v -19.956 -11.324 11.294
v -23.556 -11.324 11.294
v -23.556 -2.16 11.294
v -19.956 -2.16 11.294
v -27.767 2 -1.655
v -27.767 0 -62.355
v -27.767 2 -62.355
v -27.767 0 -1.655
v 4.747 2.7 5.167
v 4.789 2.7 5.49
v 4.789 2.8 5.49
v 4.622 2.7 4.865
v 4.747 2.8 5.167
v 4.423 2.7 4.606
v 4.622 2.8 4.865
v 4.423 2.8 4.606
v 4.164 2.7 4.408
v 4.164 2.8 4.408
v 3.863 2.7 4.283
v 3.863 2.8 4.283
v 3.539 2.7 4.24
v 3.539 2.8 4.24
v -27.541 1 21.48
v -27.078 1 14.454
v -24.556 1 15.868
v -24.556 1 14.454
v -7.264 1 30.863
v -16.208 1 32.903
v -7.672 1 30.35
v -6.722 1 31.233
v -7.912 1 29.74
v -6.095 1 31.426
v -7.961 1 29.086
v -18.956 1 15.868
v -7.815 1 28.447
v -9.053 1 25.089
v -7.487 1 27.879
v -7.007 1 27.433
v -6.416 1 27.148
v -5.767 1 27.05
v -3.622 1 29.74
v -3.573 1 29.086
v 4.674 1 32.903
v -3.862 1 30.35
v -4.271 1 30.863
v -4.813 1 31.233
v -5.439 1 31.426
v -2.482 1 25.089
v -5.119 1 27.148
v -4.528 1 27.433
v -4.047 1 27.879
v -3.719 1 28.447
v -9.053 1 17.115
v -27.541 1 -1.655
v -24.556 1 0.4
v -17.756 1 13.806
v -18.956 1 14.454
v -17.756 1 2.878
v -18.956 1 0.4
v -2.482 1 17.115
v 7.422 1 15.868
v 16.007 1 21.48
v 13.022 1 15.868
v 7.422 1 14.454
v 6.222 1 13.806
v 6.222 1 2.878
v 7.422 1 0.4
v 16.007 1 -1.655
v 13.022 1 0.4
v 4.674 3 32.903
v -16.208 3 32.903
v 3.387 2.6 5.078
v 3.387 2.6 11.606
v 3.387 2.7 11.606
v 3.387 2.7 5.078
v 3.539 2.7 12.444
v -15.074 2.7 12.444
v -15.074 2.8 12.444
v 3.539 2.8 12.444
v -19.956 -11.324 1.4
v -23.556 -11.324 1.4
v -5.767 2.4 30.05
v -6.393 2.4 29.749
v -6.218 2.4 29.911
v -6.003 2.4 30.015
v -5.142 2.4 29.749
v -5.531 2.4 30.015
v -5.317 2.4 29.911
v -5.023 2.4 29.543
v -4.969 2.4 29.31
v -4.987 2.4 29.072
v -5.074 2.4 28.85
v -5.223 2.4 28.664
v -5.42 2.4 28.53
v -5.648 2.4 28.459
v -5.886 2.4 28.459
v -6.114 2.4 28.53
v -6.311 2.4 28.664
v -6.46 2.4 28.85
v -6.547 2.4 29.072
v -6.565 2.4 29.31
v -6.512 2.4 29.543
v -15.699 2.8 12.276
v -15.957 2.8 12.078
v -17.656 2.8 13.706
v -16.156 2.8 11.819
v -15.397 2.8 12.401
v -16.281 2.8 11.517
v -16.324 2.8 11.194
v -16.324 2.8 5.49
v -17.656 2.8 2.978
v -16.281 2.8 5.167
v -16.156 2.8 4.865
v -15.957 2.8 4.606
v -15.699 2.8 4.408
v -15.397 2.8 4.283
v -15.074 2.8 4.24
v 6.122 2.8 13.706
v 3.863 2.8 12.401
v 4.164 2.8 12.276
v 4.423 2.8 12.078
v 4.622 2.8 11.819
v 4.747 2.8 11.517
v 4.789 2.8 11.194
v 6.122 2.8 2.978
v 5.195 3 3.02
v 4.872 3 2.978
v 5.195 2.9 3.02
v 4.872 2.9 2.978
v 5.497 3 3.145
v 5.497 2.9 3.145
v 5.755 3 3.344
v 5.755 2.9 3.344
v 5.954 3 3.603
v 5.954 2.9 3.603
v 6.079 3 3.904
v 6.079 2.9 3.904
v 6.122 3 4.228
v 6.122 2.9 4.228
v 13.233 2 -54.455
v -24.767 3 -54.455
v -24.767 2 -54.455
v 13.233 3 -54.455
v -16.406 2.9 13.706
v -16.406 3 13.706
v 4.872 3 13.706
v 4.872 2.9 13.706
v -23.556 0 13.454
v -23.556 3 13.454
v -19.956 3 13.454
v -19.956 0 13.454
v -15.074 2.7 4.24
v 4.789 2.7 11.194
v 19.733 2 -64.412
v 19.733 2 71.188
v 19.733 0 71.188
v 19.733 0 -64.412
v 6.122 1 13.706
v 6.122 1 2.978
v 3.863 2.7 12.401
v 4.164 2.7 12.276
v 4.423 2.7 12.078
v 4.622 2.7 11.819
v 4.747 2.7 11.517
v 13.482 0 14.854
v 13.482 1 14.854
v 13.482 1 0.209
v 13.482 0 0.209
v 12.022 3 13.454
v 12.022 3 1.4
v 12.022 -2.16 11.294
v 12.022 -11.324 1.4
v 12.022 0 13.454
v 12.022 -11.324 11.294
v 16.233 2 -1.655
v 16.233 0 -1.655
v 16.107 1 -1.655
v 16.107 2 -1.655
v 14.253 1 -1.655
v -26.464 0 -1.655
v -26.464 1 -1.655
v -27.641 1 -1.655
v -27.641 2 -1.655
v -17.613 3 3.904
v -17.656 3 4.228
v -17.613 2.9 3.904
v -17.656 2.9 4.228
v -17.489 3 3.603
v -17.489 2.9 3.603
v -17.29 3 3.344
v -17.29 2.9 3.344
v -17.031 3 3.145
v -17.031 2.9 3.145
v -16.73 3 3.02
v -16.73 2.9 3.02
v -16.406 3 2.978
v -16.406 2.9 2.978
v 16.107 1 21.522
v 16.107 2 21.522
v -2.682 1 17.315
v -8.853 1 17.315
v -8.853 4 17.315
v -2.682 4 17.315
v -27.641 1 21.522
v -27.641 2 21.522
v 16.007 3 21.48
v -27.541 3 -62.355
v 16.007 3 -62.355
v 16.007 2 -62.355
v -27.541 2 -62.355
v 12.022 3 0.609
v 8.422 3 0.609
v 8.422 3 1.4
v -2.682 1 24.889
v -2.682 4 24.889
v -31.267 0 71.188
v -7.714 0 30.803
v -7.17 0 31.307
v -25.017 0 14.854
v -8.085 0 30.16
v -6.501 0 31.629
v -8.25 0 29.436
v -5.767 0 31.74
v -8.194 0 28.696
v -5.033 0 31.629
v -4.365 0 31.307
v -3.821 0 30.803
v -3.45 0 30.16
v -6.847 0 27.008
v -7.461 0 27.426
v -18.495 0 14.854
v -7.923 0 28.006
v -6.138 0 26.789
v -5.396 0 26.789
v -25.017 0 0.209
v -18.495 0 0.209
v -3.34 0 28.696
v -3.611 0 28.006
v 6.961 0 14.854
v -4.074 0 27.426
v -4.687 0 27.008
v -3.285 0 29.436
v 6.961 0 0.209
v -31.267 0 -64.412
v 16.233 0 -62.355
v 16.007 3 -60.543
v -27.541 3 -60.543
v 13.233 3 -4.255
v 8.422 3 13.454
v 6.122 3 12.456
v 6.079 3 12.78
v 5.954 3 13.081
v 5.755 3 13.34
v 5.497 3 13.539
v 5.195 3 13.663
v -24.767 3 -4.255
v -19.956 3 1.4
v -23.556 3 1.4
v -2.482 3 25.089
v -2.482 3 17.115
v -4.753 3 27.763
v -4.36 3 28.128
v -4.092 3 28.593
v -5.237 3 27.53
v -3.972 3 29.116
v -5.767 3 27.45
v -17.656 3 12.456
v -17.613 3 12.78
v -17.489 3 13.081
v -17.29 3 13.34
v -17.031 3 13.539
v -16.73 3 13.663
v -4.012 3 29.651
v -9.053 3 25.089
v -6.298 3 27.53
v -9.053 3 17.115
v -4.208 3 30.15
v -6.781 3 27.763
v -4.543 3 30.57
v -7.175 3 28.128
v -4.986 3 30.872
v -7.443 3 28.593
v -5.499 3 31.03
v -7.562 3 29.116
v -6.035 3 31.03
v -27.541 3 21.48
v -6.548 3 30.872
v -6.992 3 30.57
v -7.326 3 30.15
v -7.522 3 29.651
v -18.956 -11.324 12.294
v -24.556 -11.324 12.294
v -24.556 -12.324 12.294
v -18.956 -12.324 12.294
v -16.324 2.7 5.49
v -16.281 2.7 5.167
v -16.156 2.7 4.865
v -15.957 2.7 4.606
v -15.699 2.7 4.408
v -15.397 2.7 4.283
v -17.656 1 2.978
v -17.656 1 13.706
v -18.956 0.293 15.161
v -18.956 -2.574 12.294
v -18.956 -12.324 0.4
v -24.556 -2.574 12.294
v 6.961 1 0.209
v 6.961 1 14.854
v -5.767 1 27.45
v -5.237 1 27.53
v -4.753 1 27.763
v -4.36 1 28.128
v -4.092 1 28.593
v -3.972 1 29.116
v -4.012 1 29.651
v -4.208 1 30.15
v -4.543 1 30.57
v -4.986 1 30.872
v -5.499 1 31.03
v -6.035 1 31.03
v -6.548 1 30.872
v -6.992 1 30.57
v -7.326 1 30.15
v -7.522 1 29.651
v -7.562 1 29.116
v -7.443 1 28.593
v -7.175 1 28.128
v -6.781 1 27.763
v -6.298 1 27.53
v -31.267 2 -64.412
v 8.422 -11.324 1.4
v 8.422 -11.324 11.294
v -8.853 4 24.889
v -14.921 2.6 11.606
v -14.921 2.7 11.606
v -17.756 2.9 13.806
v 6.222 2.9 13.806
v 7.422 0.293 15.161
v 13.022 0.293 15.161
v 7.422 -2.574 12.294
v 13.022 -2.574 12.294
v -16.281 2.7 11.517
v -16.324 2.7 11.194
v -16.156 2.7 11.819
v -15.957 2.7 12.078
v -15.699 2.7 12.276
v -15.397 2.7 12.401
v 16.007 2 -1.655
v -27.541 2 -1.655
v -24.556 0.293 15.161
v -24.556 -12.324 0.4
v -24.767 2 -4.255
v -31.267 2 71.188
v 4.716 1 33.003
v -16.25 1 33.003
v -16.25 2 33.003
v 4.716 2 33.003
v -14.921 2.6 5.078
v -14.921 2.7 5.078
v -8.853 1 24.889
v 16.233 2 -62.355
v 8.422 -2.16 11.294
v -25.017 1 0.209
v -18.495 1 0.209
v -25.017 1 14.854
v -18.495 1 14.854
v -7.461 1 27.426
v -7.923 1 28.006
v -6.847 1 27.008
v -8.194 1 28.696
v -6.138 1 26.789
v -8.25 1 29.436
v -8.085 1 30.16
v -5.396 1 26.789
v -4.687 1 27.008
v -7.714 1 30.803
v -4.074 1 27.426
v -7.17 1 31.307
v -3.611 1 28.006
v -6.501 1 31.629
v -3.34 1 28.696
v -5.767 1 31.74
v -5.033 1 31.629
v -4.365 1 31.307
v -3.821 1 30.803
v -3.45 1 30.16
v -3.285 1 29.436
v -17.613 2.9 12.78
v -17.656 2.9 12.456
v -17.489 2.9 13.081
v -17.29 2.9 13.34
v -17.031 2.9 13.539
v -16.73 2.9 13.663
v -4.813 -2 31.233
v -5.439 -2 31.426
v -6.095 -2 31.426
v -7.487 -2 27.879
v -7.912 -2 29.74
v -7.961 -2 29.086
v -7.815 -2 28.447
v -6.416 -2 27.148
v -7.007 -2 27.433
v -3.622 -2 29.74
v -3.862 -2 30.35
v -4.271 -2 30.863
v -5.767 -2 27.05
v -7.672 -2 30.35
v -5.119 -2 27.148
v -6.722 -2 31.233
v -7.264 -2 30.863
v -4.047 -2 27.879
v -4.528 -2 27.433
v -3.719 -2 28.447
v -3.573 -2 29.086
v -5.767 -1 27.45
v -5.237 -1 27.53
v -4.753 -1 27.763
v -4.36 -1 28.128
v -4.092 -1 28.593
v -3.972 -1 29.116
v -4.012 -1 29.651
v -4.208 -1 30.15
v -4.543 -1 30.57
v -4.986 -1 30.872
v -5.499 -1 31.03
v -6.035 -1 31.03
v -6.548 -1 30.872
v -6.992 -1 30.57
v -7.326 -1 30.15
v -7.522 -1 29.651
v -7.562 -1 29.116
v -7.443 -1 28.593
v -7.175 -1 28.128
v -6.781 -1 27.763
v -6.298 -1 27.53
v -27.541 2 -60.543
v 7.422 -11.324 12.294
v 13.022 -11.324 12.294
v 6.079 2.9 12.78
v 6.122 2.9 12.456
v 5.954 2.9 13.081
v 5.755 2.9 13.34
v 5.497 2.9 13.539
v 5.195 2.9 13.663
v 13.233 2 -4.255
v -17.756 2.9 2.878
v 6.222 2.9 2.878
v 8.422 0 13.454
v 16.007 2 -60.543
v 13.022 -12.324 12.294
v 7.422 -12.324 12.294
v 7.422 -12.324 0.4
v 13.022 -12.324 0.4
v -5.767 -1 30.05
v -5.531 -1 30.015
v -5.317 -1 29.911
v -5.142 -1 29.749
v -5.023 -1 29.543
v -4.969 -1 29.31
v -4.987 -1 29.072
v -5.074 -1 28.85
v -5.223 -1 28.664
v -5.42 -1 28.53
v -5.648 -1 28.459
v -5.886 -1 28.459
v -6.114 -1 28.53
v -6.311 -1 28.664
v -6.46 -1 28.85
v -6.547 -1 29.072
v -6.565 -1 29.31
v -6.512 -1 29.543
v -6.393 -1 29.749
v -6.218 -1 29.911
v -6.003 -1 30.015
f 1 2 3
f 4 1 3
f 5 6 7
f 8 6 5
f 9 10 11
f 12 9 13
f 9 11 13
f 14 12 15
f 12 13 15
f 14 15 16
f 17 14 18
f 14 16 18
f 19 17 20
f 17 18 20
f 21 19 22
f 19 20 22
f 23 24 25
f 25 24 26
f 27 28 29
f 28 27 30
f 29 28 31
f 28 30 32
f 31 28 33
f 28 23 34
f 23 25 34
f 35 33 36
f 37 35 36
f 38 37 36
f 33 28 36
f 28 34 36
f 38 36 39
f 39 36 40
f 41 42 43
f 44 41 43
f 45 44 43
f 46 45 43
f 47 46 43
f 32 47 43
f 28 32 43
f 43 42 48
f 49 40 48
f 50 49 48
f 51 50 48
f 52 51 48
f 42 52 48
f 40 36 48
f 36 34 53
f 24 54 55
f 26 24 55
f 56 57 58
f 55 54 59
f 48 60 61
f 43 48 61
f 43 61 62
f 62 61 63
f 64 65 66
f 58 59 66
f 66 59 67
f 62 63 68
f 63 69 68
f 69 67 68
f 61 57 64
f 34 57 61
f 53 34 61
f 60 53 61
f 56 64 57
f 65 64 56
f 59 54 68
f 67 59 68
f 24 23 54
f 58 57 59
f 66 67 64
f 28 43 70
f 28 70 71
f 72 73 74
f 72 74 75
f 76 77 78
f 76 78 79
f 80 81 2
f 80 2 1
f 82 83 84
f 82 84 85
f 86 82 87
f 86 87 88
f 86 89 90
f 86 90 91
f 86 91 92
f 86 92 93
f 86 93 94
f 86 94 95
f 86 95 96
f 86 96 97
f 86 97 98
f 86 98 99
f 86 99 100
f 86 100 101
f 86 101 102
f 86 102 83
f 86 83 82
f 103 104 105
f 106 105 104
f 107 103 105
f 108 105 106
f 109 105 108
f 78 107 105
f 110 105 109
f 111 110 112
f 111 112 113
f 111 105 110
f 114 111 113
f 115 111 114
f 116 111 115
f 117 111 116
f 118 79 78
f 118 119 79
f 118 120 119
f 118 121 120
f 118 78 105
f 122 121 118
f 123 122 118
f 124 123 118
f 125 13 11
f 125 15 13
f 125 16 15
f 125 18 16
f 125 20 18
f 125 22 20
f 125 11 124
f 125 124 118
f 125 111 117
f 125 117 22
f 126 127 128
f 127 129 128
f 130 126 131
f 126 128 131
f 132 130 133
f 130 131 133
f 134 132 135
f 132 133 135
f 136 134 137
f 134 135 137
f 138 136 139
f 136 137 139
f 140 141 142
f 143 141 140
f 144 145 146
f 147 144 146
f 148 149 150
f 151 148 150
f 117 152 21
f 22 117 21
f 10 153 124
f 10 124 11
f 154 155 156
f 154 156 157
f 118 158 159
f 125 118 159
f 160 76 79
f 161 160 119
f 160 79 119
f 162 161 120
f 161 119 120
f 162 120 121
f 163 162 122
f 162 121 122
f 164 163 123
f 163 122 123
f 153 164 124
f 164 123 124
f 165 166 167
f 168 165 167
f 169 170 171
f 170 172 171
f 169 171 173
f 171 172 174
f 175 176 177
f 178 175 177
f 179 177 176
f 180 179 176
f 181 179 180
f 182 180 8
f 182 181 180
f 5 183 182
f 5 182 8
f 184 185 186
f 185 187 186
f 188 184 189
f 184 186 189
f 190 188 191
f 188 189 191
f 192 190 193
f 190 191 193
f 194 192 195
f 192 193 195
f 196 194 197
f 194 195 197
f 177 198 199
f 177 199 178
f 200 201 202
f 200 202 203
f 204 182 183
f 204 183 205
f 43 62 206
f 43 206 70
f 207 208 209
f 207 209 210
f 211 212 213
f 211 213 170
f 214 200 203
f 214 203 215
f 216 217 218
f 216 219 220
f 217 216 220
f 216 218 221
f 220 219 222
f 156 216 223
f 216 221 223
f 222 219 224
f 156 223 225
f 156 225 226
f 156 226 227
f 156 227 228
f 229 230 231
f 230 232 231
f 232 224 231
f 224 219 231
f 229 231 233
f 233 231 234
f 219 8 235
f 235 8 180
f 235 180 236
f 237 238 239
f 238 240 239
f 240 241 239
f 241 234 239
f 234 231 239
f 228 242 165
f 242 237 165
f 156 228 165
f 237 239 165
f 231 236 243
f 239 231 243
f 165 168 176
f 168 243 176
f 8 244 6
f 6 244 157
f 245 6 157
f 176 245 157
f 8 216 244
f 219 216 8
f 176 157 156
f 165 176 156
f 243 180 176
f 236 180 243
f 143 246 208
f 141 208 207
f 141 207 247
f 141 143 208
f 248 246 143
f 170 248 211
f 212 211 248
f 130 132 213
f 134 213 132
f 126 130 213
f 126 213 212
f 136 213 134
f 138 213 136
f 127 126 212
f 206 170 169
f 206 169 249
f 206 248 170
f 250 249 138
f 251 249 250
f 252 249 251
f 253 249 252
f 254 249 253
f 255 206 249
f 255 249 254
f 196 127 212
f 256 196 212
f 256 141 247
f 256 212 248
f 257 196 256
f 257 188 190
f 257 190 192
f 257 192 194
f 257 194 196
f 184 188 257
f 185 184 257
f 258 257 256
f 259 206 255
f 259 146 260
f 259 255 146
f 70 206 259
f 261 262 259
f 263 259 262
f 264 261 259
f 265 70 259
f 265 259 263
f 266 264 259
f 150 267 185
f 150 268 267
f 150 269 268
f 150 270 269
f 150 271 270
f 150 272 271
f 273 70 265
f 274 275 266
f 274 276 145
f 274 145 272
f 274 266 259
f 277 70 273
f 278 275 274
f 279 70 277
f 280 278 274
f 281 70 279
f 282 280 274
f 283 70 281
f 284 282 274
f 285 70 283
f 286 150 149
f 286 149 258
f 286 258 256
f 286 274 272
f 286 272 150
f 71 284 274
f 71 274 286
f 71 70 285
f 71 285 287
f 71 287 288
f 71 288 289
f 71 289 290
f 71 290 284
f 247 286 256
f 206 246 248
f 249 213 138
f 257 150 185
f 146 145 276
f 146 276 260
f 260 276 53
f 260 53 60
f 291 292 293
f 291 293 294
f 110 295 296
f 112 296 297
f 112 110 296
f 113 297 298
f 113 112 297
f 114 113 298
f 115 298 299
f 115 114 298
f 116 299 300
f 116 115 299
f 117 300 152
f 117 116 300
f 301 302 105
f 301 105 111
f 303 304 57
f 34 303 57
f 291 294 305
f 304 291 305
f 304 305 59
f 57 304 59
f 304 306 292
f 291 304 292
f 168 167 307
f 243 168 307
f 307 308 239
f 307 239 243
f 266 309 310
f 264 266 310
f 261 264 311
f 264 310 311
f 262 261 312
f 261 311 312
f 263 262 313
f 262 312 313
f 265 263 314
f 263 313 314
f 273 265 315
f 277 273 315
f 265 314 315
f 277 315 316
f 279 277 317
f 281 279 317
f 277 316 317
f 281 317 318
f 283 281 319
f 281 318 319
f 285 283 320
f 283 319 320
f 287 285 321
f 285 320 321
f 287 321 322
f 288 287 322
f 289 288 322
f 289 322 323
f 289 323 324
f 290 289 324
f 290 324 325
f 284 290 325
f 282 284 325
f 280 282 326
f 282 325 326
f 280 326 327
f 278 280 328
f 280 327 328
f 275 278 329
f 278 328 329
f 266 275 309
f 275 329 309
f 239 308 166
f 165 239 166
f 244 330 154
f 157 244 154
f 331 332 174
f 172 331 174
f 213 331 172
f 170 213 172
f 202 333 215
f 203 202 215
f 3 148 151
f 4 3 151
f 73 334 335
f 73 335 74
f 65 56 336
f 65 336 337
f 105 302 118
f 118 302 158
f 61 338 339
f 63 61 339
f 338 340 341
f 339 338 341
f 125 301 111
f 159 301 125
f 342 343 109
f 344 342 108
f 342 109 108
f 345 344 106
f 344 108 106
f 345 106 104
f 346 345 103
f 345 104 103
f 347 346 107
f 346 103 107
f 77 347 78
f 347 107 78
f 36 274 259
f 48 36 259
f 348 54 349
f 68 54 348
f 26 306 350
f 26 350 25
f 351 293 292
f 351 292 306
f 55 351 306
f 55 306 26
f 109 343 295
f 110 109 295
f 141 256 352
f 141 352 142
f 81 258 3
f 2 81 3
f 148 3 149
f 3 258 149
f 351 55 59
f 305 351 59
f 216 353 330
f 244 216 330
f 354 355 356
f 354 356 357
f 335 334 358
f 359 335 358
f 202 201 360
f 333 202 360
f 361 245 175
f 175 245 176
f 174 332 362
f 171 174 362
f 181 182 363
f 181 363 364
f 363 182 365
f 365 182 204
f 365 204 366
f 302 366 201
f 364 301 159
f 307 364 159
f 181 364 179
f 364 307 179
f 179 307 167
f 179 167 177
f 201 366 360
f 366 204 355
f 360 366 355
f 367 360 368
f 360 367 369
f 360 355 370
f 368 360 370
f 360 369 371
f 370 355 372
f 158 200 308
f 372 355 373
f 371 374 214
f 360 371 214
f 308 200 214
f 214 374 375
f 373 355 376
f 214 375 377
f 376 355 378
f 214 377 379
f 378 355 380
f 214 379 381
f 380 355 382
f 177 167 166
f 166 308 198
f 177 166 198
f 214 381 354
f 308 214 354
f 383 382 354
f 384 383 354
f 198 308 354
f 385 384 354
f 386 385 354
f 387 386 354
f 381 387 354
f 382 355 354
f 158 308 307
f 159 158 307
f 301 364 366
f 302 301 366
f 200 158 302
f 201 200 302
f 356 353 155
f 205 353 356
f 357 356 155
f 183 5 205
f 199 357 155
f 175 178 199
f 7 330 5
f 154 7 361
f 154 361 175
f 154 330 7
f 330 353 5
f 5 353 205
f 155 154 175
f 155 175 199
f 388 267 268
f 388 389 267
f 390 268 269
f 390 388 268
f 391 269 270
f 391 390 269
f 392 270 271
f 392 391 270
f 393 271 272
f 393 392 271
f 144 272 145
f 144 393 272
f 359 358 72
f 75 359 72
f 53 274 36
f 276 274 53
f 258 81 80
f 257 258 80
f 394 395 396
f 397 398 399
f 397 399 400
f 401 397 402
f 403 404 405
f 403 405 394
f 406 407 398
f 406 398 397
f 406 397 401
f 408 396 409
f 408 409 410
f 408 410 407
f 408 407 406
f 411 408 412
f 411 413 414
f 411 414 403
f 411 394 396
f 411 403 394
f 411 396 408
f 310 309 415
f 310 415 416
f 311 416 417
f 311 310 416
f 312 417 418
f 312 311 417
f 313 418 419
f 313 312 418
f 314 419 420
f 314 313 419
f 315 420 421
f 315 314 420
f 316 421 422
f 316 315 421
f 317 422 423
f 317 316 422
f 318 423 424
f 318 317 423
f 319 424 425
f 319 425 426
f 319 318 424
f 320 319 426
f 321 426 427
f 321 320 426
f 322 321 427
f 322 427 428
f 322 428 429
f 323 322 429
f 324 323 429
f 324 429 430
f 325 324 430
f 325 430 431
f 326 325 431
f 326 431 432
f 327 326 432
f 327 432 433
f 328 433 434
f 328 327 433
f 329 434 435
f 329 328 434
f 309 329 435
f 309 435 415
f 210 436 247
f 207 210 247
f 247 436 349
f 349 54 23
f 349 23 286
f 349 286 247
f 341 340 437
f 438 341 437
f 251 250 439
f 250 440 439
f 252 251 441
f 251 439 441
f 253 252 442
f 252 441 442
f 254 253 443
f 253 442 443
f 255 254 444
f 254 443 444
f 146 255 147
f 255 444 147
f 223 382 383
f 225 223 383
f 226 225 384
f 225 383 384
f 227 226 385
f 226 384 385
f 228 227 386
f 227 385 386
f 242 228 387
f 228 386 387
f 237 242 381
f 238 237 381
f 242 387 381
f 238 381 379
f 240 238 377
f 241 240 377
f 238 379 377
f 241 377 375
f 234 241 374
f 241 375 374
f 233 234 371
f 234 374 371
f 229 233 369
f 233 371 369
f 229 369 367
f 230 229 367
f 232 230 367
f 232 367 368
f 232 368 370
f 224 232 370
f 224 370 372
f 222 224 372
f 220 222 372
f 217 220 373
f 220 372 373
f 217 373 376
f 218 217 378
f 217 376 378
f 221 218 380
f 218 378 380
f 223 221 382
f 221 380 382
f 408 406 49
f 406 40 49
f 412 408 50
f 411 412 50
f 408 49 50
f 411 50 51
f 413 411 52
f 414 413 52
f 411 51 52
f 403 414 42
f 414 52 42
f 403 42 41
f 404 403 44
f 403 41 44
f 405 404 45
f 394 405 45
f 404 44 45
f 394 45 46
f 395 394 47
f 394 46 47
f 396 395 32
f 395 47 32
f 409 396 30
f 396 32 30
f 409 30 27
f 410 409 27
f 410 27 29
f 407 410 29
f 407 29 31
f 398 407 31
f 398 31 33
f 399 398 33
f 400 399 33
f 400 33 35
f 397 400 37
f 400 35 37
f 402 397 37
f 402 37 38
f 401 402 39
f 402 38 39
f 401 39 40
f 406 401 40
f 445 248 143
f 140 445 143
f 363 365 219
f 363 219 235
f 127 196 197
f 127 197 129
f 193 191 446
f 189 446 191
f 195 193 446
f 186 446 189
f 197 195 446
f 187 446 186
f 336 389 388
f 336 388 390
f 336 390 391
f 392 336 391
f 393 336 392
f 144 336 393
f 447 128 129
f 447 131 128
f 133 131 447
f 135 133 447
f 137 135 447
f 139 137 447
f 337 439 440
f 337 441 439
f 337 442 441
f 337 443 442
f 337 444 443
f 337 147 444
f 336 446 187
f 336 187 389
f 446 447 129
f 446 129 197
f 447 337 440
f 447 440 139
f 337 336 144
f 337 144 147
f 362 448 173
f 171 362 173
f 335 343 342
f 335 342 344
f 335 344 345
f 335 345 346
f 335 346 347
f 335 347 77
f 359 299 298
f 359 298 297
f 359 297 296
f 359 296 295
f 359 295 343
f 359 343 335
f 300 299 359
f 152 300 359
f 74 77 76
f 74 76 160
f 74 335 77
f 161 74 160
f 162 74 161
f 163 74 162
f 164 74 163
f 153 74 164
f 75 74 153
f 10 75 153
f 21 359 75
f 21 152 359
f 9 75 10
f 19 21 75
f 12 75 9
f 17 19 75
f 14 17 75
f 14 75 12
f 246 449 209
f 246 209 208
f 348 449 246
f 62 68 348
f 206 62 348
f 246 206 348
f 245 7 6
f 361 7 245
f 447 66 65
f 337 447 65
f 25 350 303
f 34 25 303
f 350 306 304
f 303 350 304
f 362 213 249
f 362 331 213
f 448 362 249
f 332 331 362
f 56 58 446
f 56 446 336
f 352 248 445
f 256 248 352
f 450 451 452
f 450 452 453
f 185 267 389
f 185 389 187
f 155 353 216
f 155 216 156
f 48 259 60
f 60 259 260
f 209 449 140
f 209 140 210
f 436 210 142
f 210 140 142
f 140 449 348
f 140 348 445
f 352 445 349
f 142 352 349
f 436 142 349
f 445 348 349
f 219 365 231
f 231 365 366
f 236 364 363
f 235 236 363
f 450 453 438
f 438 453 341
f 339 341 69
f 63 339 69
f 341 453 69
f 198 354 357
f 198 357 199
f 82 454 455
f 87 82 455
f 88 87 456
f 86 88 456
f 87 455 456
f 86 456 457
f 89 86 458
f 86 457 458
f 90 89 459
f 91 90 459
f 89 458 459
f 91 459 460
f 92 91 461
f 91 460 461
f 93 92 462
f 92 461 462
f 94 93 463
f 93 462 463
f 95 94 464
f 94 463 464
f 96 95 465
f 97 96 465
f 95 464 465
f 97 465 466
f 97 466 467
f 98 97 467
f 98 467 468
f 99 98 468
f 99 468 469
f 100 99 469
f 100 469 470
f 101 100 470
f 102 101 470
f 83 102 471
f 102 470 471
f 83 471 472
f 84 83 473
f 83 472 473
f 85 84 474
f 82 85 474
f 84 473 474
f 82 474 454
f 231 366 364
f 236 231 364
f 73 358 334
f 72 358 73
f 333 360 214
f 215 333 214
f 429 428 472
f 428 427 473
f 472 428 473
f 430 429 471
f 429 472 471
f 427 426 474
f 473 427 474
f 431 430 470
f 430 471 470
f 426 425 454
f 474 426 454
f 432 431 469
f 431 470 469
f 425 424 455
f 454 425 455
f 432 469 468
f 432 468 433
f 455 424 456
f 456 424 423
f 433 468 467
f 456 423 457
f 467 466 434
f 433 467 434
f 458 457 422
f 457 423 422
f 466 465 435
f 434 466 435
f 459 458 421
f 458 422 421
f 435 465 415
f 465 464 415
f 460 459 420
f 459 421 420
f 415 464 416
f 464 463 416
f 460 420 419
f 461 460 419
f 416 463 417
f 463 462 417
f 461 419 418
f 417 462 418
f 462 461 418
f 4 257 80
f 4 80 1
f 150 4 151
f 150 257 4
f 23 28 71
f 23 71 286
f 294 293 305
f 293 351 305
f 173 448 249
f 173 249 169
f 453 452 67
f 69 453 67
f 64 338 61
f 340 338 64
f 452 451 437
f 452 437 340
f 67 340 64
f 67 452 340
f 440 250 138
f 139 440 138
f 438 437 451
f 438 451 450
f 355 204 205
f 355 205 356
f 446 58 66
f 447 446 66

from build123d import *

# Parameters (mm, degrees)
SKETCH1_W                   = 51.332398317
SKETCH1_H                   = 136.325385694
BOSS_EXTRUDE1_DEPTH         = 2
CUT_EXTRUDE1_DEPTH          = 1
SKETCH3_W                   = 26.718092566
SKETCH3_H                   = 51.160838605
CUT_EXTRUDE2_DEPTH          = 1
SKETCH4_W                   = 20.659186536
SKETCH4_H                   = 13.604488078
BOSS_EXTRUDE2_DEPTH         = 1
SKETCH5_W                   = 6.521739131
SKETCH5_H                   = 14.853538096
SKETCH5_W_2                 = 6.52173913
SKETCH5_H_2                 = 15.644764374
CUT_EXTRUDE3_DEPTH          = 1
SKETCH6_W                   = 6.171107994
SKETCH6_H                   = 7.573632539
CUT_EXTRUDE4_DEPTH          = 1
SKETCH7_R                   = 2.489481066
CUT_EXTRUDE5_DEPTH          = 1
BOSS_EXTRUDE3_DEPTH         = 1
SKETCH10_W                  = 6.171107994
SKETCH10_H                  = 7.573632539
BOSS_EXTRUDE4_DEPTH         = 4
BOSS_EXTRUDE5_DEPTH         = 2
SKETCH12_W                  = 6.571107994
SKETCH12_H                  = 7.973632539
CUT_EXTRUDE6_DEPTH          = 2
SKETCH13_R                  = 1.8
SKETCH13_W                  = 26.718092566
SKETCH13_H                  = 51.160838605
CUT_EXTRUDE9_DEPTH          = 2
SKETCH14_R                  = 2.2
SKETCH14_R_2                = 1.8
BOSS_EXTRUDE11_DEPTH        = 2
SKETCH17_R                  = 2.2
BOSS_EXTRUDE12_DEPTH        = 1
SKETCH18_R                  = 0.8
BOSS_EXTRUDE15_DEPTH        = 3.4
EXTRUDE_THIN3_OUTLINE_W     = 5.6
EXTRUDE_THIN3_OUTLINE_H     = 14.844764374
EXTRUDE_THIN3_OUTLINE_W_2   = 3.6
EXTRUDE_THIN3_OUTLINE_H_2   = 12.844764374
EXTRUDE_THIN3_DEPTH         = 13.32398317
EXTRUDE_THIN3_2_OUTLINE_W   = 5.6
EXTRUDE_THIN3_2_OUTLINE_H   = 14.053538096
EXTRUDE_THIN3_2_OUTLINE_W_2 = 3.6
EXTRUDE_THIN3_2_OUTLINE_H_2 = 12.053538096
EXTRUDE_THIN3_2_DEPTH       = 13.32398317
SKETCH26_W                  = 3.6
SKETCH26_H                  = 12.053538096
SKETCH26_H_2                = 12.844764374
CUT_EXTRUDE12_DEPTH         = 13.32398317
SKETCH27_W                  = 5.6
SKETCH27_H                  = 14.053538096
BOSS_EXTRUDE18_DEPTH        = 1
SKETCH27_W_2                = 5.570395019
SKETCH27_H_2                = 14.844764374
BOSS_EXTRUDE18_2_DEPTH      = 1
SKETCH28_W                  = 20.659186536
SKETCH28_H                  = 13.604488078
CUT_EXTRUDE13_DEPTH         = 1
SKETCH29_W                  = 23.777559608
SKETCH29_H                  = 10.728152402
CUT_EXTRUDE15_DEPTH         = 10
SKETCH30_W                  = 23.777559608
SKETCH30_H                  = 10.728152402
SKETCH30_W_2                = 21.112762974
SKETCH30_H_2                = 8.203608222
BOSS_EXTRUDE20_DEPTH        = 1.8
SKETCH31_W                  = 21.112762974
SKETCH31_H                  = 8.203608222
BOSS_EXTRUDE21_DEPTH        = 1.6
SKETCH35_W                  = 23.977559608
SKETCH35_H                  = 10.928152402
CUT_EXTRUDE21_DEPTH         = 1.9
FILLET2_R                   = 1.25
FILLET3_R                   = 1.25
SKETCH37_W                  = 18.307713885
SKETCH37_H                  = 6.527591392
CUT_EXTRUDE22_DEPTH         = 0.1
SKETCH41_W                  = 18.307713885
SKETCH41_H                  = 6.527591392
BOSS_EXTRUDE27_DEPTH        = 0.1
SKETCH43_W                  = 18.307713885
SKETCH43_H                  = 6.527591392
BOSS_EXTRUDE28_DEPTH        = 0.1
CUT_EXTRUDE24_DEPTH         = 40.1
SKETCH51_W                  = 5.6
SKETCH51_H                  = 4.468914857
BOSS_EXTRUDE29_DEPTH        = 1
BOSS_EXTRUDE29_2_DEPTH      = 1
SKETCH52_W                  = 5.6
SKETCH52_H                  = 1
BOSS_EXTRUDE30_DEPTH        = 2.5
BOSS_EXTRUDE30_2_DEPTH      = 2.5
SKETCH53_W                  = 5.6
SKETCH53_H                  = 1
BOSS_EXTRUDE31_DEPTH        = 1
BOSS_EXTRUDE32_START        = 7.421556697
BOSS_EXTRUDE32_DEPTH        = 5.6
BOSS_EXTRUDE32_START_2      = -24.556002911
BOSS_EXTRUDE32_2_DEPTH      = 5.6
SKETCH55_W                  = 3.6
SKETCH55_H                  = 0.791226278
BOSS_EXTRUDE33_DEPTH        = 14.323983
SKETCH56_W                  = 0.791226278
SKETCH56_H                  = 13.32398317
CUT_EXTRUDE25_DEPTH         = 5.6
CUT_EXTRUDE_THIN1_DEPTH     = 1
SKETCH59_W                  = 71.33
SKETCH59_H                  = 156.33
SKETCH59_W_2                = 51.33
SKETCH59_H_2                = 136.33
CUT_EXTRUDE_THIN2_DEPTH     = 10
SKETCH60_W                  = 71
SKETCH60_H                  = 156
SKETCH60_W_2                = 51
SKETCH60_H_2                = 136
CUT_EXTRUDE_THIN3_DEPTH     = 10
SKETCH61_W                  = 51
SKETCH61_H                  = 2
CUT_EXTRUDE26_DEPTH         = 0.4
SKETCH62_W                  = 38
SKETCH62_H                  = 51.160838605
CUT_EXTRUDE28_DEPTH         = 10
SKETCH64_W                  = 38
SKETCH64_H                  = 0.08
BOSS_EXTRUDE35_DEPTH        = 2
SKETCH65_W                  = 38
SKETCH65_H                  = 0.08
BOSS_EXTRUDE37_DEPTH        = 1
SKETCH67_W                  = 44
SKETCH67_H                  = 61.400838605
CUT_EXTRUDE31_DEPTH         = 2
SKETCH69_W                  = 40.716981818
SKETCH69_H                  = 1
BOSS_EXTRUDE39_DEPTH        = 1.863286117
SKETCH70_W                  = 44
SKETCH70_H                  = 2
BOSS_EXTRUDE40_DEPTH        = 1
SKETCH71_W                  = 38
SKETCH71_H                  = 1
CUT_EXTRUDE32_DEPTH         = 1
SKETCH72_W                  = 38
SKETCH72_H                  = 1
BOSS_EXTRUDE41_DEPTH        = 1.8
SKETCH73_W                  = 44
SKETCH73_H                  = 2
CUT_EXTRUDE33_DEPTH         = 0.3
SKETCH74_W                  = 43.548387097
SKETCH74_H                  = 1
BOSS_EXTRUDE43_DEPTH        = 1.812426367


with BuildPart() as part:
    # Sketch1 → Boss-Extrude1 (new body)
    with BuildSketch(Plane(origin=(0, 0, 0), x_dir=(1, 0, 0), z_dir=(0, 1, 0))):
        with Locations((-5.767223106, -3.58751015)):
            Rectangle(SKETCH1_W, SKETCH1_H)
    extrude(amount=BOSS_EXTRUDE1_DEPTH)

    # Sketch2 → Cut-Extrude1 (cut)
    with BuildSketch(Plane(origin=(0, 2, 0), x_dir=(1, 0, 0), z_dir=(0, 1, 0))):
        Polygon((-27.541416655, -30.445855171), (-27.541416655, 60.542924633), (16.006970442, 60.542924633), (16.006970442, -30.445855171), (4.678976052, -41.666051524), (-16.213422265, -41.666051524), align=None)
    extrude(amount=-CUT_EXTRUDE1_DEPTH, mode=Mode.SUBTRACT)

    # Sketch3 → Cut-Extrude2 (cut)
    with BuildSketch(Plane(origin=(0, 1, 0), x_dir=(1, 0, 0), z_dir=(0, 1, 0))):
        with Locations((-5.767223107, 30.754931698)):
            Rectangle(SKETCH3_W, SKETCH3_H)
    extrude(amount=-CUT_EXTRUDE2_DEPTH, mode=Mode.SUBTRACT)

    # Sketch4 → Boss-Extrude2 (add)
    with BuildSketch(Plane(origin=(0, 1, 0), x_dir=(1, 0, 0), z_dir=(0, 1, 0))):
        with Locations((-5.767223107, -7.988180452)):
            Rectangle(SKETCH4_W, SKETCH4_H)
    extrude(amount=BOSS_EXTRUDE2_DEPTH)

    # Sketch5 → Cut-Extrude3 (cut)
    with BuildSketch(Plane(origin=(0, 1, 0), x_dir=(1, 0, 0), z_dir=(0, 1, 0))):
        with Locations((-21.756002911, -7.426769048)):
            Rectangle(SKETCH5_W, SKETCH5_H)
        with Locations((10.221556697, -7.031155909)):
            Rectangle(SKETCH5_W_2, SKETCH5_H_2)
    extrude(amount=-CUT_EXTRUDE3_DEPTH, mode=Mode.SUBTRACT)

    # Sketch6 → Cut-Extrude4 (cut)
    with BuildSketch(Plane(origin=(0, 1, 0), x_dir=(1, 0, 0), z_dir=(0, 1, 0))):
        with Locations((-5.767223107, -21.101784941)):
            Rectangle(SKETCH6_W, SKETCH6_H)
    extrude(amount=-CUT_EXTRUDE4_DEPTH, mode=Mode.SUBTRACT)

    # Sketch7 → Cut-Extrude5 (cut)
    with BuildSketch(Plane(origin=(0, 1, 0), x_dir=(1, 0, 0), z_dir=(0, 1, 0))):
        with Locations(Location((-5.767223107, -29.250452542, 0), (0, 0, 270))):
            Circle(SKETCH7_R)
    extrude(amount=-CUT_EXTRUDE5_DEPTH, mode=Mode.SUBTRACT)

    # Sketch8 → Boss-Extrude3 (add)
    with BuildSketch(Plane(origin=(0, 1, 0), x_dir=(1, 0, 0), z_dir=(0, 1, 0))):
        Polygon((-27.541416655, -21.480466567), (-27.541416655, -30.445855171), (-16.213422265, -41.666051524), (4.678976052, -41.666051524), (16.006970442, -30.445855171), (16.006970442, -21.480466567), (4.673870862, -32.903327717), (-16.208317076, -32.903327717), align=None)
    extrude(amount=BOSS_EXTRUDE3_DEPTH)

    # Sketch10 → Boss-Extrude4 (add)
    with BuildSketch(Plane.XZ):
        with Locations((-5.767223107, 21.101784941)):
            Rectangle(SKETCH10_W, SKETCH10_H)
    extrude(amount=-BOSS_EXTRUDE4_DEPTH)

    # Sketch28 → Cut-Extrude13 (cut)
    with BuildSketch(Plane(origin=(0, 2, 0), x_dir=(1, 0, 0), z_dir=(0, 1, 0))):
        with Locations((-5.767223107, -7.988180452)):
            Rectangle(SKETCH28_W, SKETCH28_H)
    extrude(amount=-CUT_EXTRUDE13_DEPTH, mode=Mode.SUBTRACT)


with BuildPart() as body_2:
    # Sketch11 → Boss-Extrude5 (new body)
    with BuildSketch(Plane(origin=(0, 1, 0), x_dir=(1, 0, 0), z_dir=(0, 1, 0))):
        Polygon((-27.541416655, 60.542924633), (16.006970442, 60.542924633), (16.006970442, -21.480466567), (4.673870862, -32.903327717), (-16.208317076, -32.903327717), (-27.541416655, -21.480466567), align=None)
    extrude(amount=BOSS_EXTRUDE5_DEPTH)

    # Sketch12 → Cut-Extrude6 (cut)
    with BuildSketch(Plane(origin=(0, 3, 0), x_dir=(1, 0, 0), z_dir=(0, 1, 0))):
        with Locations((-5.767223107, -21.10178494)):
            Rectangle(SKETCH12_W, SKETCH12_H)
    extrude(amount=-CUT_EXTRUDE6_DEPTH, mode=Mode.SUBTRACT)

    # Sketch13 → Cut-Extrude9 (cut)
    with BuildSketch(Plane.XZ.offset(-1)):
        with Locations(Location((-5.767223107, 29.250452542, 0), (0, 0, 270))):
            Circle(SKETCH13_R)
        with Locations((-5.767223107, -30.754931698)):
            Rectangle(SKETCH13_W, SKETCH13_H)
    extrude(amount=-CUT_EXTRUDE9_DEPTH, mode=Mode.SUBTRACT)


with BuildPart() as body_3:
    # Sketch14 → Boss-Extrude11 (new body)
    with BuildSketch(Plane.XZ.offset(-1)):
        with Locations(Location((-5.767223107, 29.250452542, 0), (0, 0, 270))):
            Circle(SKETCH14_R)
        with Locations(Location((-5.767223107, 29.250452542, 0), (0, 0, 270))):
            Circle(SKETCH14_R_2, mode=Mode.SUBTRACT)
    extrude(amount=BOSS_EXTRUDE11_DEPTH)

    # Combine1: union body 2
    add(body_2.part)

    # Sketch17 → Boss-Extrude12 (add)
    with BuildSketch(Plane.XZ.offset(1)):
        with Locations(Location((-5.767223107, 29.250452542, 0), (0, 0, 270))):
            Circle(SKETCH17_R)
    extrude(amount=BOSS_EXTRUDE12_DEPTH)


with BuildPart() as body_3_2:
    # Sketch18 → Boss-Extrude15 (new body)
    with BuildSketch(Plane(origin=(0, -1, 0), x_dir=(1, 0, 0), z_dir=(0, 1, 0))):
        with Locations(Location((-5.767223107, -29.250452542, 0), (0, 0, 270))):
            Circle(SKETCH18_R)
    extrude(amount=BOSS_EXTRUDE15_DEPTH)


with BuildPart() as body_3_1:
    add(body_3.part)

    # Combine3: union body 3 2
    add(body_3_2.part)

    # Sketch26 → Cut-Extrude12 (cut)
    with BuildSketch(Plane.XZ.offset(-1)):
        with Locations((-21.756002911, 7.426769048)):
            Rectangle(SKETCH26_W, SKETCH26_H)
        with Locations((10.221556697, 7.031155909)):
            Rectangle(SKETCH26_W, SKETCH26_H_2)
    extrude(amount=-CUT_EXTRUDE12_DEPTH, mode=Mode.SUBTRACT)


with BuildPart() as body_3_3:
    # Extrude-Thin3: read off the stored shape, not the designer's step
    # Extrude-Thin3 outline → Extrude-Thin3 (new body)
    with BuildSketch(Plane.XZ.offset(-1)):
        with Locations((10.221556697, 7.031155909)):
            Rectangle(EXTRUDE_THIN3_OUTLINE_W, EXTRUDE_THIN3_OUTLINE_H)
        with Locations((10.221556697, 7.031155909)):
            Rectangle(EXTRUDE_THIN3_OUTLINE_W_2, EXTRUDE_THIN3_OUTLINE_H_2, mode=Mode.SUBTRACT)
    extrude(amount=EXTRUDE_THIN3_DEPTH)


with BuildPart() as body_4:
    # Extrude-Thin3 2 outline → Extrude-Thin3 2 (new body)
    with BuildSketch(Plane.XZ.offset(-1)):
        with Locations((-21.756002911, 7.426769048)):
            Rectangle(EXTRUDE_THIN3_2_OUTLINE_W, EXTRUDE_THIN3_2_OUTLINE_H)
        with Locations((-21.756002911, 7.426769048)):
            Rectangle(EXTRUDE_THIN3_2_OUTLINE_W_2, EXTRUDE_THIN3_2_OUTLINE_H_2, mode=Mode.SUBTRACT)
    extrude(amount=EXTRUDE_THIN3_2_DEPTH)


with BuildPart() as body_5:
    # Sketch27 → Boss-Extrude18 (new body)
    with BuildSketch(Plane.XZ.offset(12.32398317)):
        with Locations((-21.756002911, 7.426769048)):
            Rectangle(SKETCH27_W, SKETCH27_H)
    extrude(amount=-BOSS_EXTRUDE18_DEPTH)


with BuildPart() as body_6:
    # Sketch27 → Boss-Extrude18 2 (new body)
    with BuildSketch(Plane.XZ.offset(12.32398317)):
        with Locations((10.206754207, 7.031155909)):
            Rectangle(SKETCH27_W_2, SKETCH27_H_2)
    extrude(amount=-BOSS_EXTRUDE18_2_DEPTH)


with BuildPart() as body_4_1:
    add(body_4.part)

    # Combine4: union body 3 3, body 3, body 5, body 6
    add(body_3_3.part)
    add(body_3_1.part)
    add(body_5.part)
    add(body_6.part)

    # Sketch29 → Cut-Extrude15 (cut)
    with BuildSketch(Plane(origin=(0, 3, 0), x_dir=(1, 0, 0), z_dir=(0, 1, 0))):
        with Locations((-5.767223107, -8.341916313)):
            Rectangle(SKETCH29_W, SKETCH29_H)
    extrude(amount=-CUT_EXTRUDE15_DEPTH, mode=Mode.SUBTRACT)

    # Sketch35 → Cut-Extrude21 (cut)
    with BuildSketch(Plane.XZ.offset(-1)):
        with Locations((-5.767223107, 8.341916313)):
            Rectangle(SKETCH35_W, SKETCH35_H)
    extrude(amount=-CUT_EXTRUDE21_DEPTH, mode=Mode.SUBTRACT)

    # Fillet2
    fillet2_edges = [body_4_1.edges().sort_by_distance(p)[0] for p in [
        (-17.656002911, 2.95, 13.705992514),
        (6.121556697, 2.95, 13.705992514),
        (6.121556697, 2.95, 2.977840112),
        (-17.656002911, 2.95, 2.977840112),
    ]]
    fillet(fillet2_edges, radius=FILLET2_R)

    # Sketch50 → Cut-Extrude24 (cut)
    with BuildSketch(Plane(origin=(13.021556697, 0, 0), x_dir=(0, 0, -1), z_dir=(1, 0, 0))):
        Polygon((-14.453538096, 1), (-11.293538096, -2.16), (-11.293538096, -12.32398317), (-14.453538096, -12.32398317), align=None)
    extrude(amount=-CUT_EXTRUDE24_DEPTH, mode=Mode.SUBTRACT)


with BuildPart() as body_3_4:
    # Sketch30 → Boss-Extrude20 (new body)
    with BuildSketch(Plane(origin=(0, 1, 0), x_dir=(1, 0, 0), z_dir=(0, 1, 0))):
        with Locations((-5.767223107, -8.341916313)):
            Rectangle(SKETCH30_W, SKETCH30_H)
        with Locations((-5.767223107, -8.341916313)):
            Rectangle(SKETCH30_W_2, SKETCH30_H_2, mode=Mode.SUBTRACT)
    extrude(amount=BOSS_EXTRUDE20_DEPTH)


with BuildPart() as body_4_2:
    # Sketch31 → Boss-Extrude21 (new body)
    with BuildSketch(Plane(origin=(0, 1, 0), x_dir=(1, 0, 0), z_dir=(0, 1, 0))):
        with Locations((-5.767223107, -8.341916313)):
            Rectangle(SKETCH31_W, SKETCH31_H)
    extrude(amount=BOSS_EXTRUDE21_DEPTH)


with BuildPart() as part_1:
    add(part.part)

    # Combine5: union body 3 4, body 4 2
    add(body_3_4.part)
    add(body_4_2.part)

    # Fillet3
    fillet3_edges = [part_1.edges().sort_by_distance(p)[0] for p in [
        (-16.323604594, 2.7, 12.443720424),
        (4.78915838, 2.7, 12.443720424),
        (4.78915838, 2.7, 4.240112202),
        (-16.323604594, 2.7, 4.240112202),
    ]]
    fillet(fillet3_edges, radius=FILLET3_R)

    # Sketch37 → Cut-Extrude22 (cut)
    with BuildSketch(Plane(origin=(0, 2.6, 0), x_dir=(1, 0, 0), z_dir=(0, 1, 0))):
        with Locations((-5.767223107, -8.341916313)):
            Rectangle(SKETCH37_W, SKETCH37_H)
    extrude(amount=-CUT_EXTRUDE22_DEPTH, mode=Mode.SUBTRACT)


with BuildPart() as body_3_5:
    # Sketch41 → Boss-Extrude27 (new body)
    with BuildSketch(Plane(origin=(0, 2.6, 0), x_dir=(1, 0, 0), z_dir=(0, 1, 0))):
        with BuildLine():
            Line((-15.073604594, -12.443720424), (3.53915838, -12.443720424))
            ThreePointArc((3.53915838, -12.443720424), (4.423041856, -12.077603901), (4.78915838, -11.193720424))
            Line((4.78915838, -11.193720424), (4.78915838, -5.490112202))
            ThreePointArc((4.78915838, -5.490112202), (4.423041856, -4.606228725), (3.53915838, -4.240112202))
            Line((3.53915838, -4.240112202), (-15.073604594, -4.240112202))
            ThreePointArc((-15.073604594, -4.240112202), (-15.95748807, -4.606228725), (-16.323604594, -5.490112202))
            Line((-16.323604594, -5.490112202), (-16.323604594, -11.193720424))
            ThreePointArc((-16.323604594, -11.193720424), (-15.95748807, -12.077603901), (-15.073604594, -12.443720424))
        make_face()
        with Locations((-5.767223107, -8.341916313)):
            Rectangle(SKETCH41_W, SKETCH41_H, mode=Mode.SUBTRACT)
    extrude(amount=BOSS_EXTRUDE27_DEPTH)

    # Combine6: union part
    add(part_1.part)


with BuildPart() as body_3_6:
    # Sketch43 → Boss-Extrude28 (new body)
    with BuildSketch(Plane(origin=(0, 2.5, 0), x_dir=(1, 0, 0), z_dir=(0, 1, 0))):
        with Locations((-5.767223107, -8.341916313)):
            Rectangle(SKETCH43_W, SKETCH43_H)
    extrude(amount=BOSS_EXTRUDE28_DEPTH)

    # Combine7: union body 3 5
    add(body_3_5.part)

    # Sketch58 → Cut-Extrude-Thin1 (cut)
    with BuildSketch(Plane(origin=(0, 1, 0), x_dir=(1, 0, 0), z_dir=(0, 1, 0))):
        Polygon((-16.249969686, -33.003327717), (4.715523472, -33.003327717), (16.106970442, -21.521657048), (16.106970442, 60.642924633), (-27.641416655, 60.642924633), (-27.641416655, -21.521657048), align=None)
        Polygon((-16.208317076, -32.903327717), (4.673870862, -32.903327717), (16.006970442, -21.480466567), (16.006970442, 60.542924633), (-27.541416655, 60.542924633), (-27.541416655, -21.480466567), align=None, mode=Mode.SUBTRACT)
    extrude(amount=CUT_EXTRUDE_THIN1_DEPTH, mode=Mode.SUBTRACT)

    # Sketch59 → Cut-Extrude-Thin2 (cut)
    with BuildSketch(Plane(origin=(0, 2, 0), x_dir=(1, 0, 0), z_dir=(0, 1, 0))):
        with Locations((-5.767223107, -3.58751015)):
            Rectangle(SKETCH59_W, SKETCH59_H)
        with Locations((-5.767223107, -3.58751015)):
            Rectangle(SKETCH59_W_2, SKETCH59_H_2, mode=Mode.SUBTRACT)
    extrude(amount=-CUT_EXTRUDE_THIN2_DEPTH, mode=Mode.SUBTRACT)

    # Sketch60 → Cut-Extrude-Thin3 (cut)
    with BuildSketch(Plane(origin=(0, 2, 0), x_dir=(1, 0, 0), z_dir=(0, 1, 0))):
        with Locations((-5.767223107, -3.58751015)):
            Rectangle(SKETCH60_W, SKETCH60_H)
        with Locations((-5.767223107, -3.58751015)):
            Rectangle(SKETCH60_W_2, SKETCH60_H_2, mode=Mode.SUBTRACT)
    extrude(amount=-CUT_EXTRUDE_THIN3_DEPTH, mode=Mode.SUBTRACT)

    # Sketch61 → Cut-Extrude26 (cut)
    with BuildSketch(Plane.XY.offset(71.58751015)):
        with Locations((-5.767223107, 1)):
            Rectangle(SKETCH61_W, SKETCH61_H)
    extrude(amount=-CUT_EXTRUDE26_DEPTH, mode=Mode.SUBTRACT)


with BuildPart() as body_3_7:
    # Sketch51 → Boss-Extrude29 (new body)
    with BuildSketch(Plane(origin=(0, -6.726769048, 6.726769048), x_dir=(1, 0, 0), z_dir=(0, -0.7071067811865475, 0.7071067811865476))):
        with Locations((10.221556697, 8.692844153)):
            Rectangle(SKETCH51_W, SKETCH51_H)
    extrude(amount=BOSS_EXTRUDE29_DEPTH)


with BuildPart() as body_4_3:
    # Sketch51 → Boss-Extrude29 2 (new body)
    with BuildSketch(Plane(origin=(0, -6.726769048, 6.726769048), x_dir=(1, 0, 0), z_dir=(0, -0.7071067811865475, 0.7071067811865476))):
        with Locations((-21.756002911, 8.692844153)):
            Rectangle(SKETCH51_W, SKETCH51_H)
    extrude(amount=BOSS_EXTRUDE29_2_DEPTH)


with BuildPart() as body_5_2:
    # Sketch52 → Boss-Extrude30 (new body)
    with BuildSketch(Plane(origin=(0, 7.726769048, 7.726769048), x_dir=(1, 0, 0), z_dir=(0, 0.7071067811865476, 0.7071067811865475))):
        with Locations((10.221556697, -10.013088019)):
            Rectangle(SKETCH52_W, SKETCH52_H)
    extrude(amount=BOSS_EXTRUDE30_DEPTH)


with BuildPart() as body_6_2:
    # Sketch52 → Boss-Extrude30 2 (new body)
    with BuildSketch(Plane(origin=(0, 7.726769048, 7.726769048), x_dir=(1, 0, 0), z_dir=(0, 0.7071067811865476, 0.7071067811865475))):
        with Locations((-21.756002911, -10.013088019)):
            Rectangle(SKETCH52_W, SKETCH52_H)
    extrude(amount=BOSS_EXTRUDE30_2_DEPTH)


with BuildPart() as body_4_4:
    add(body_4_1.part)

    # Combine8: union body 3 7, body 4 3, body 5 2, body 6 2
    add(body_3_7.part)
    add(body_4_3.part)
    add(body_5_2.part)
    add(body_6_2.part)

    # Sketch53 → Boss-Extrude31 (add)
    with BuildSketch(Plane.XY.offset(11.293538096)):
        with Locations((-21.756002911, -11.82398317)):
            Rectangle(SKETCH53_W, SKETCH53_H)
        with Locations((10.221556697, -11.82398317)):
            Rectangle(SKETCH53_W, SKETCH53_H)
    extrude(amount=BOSS_EXTRUDE31_DEPTH)


with BuildPart() as body_3_8:
    # Boss-Extrude32: read off the stored shape, not the designer's step
    # Boss-Extrude32 outline → Boss-Extrude32 (new body)
    with BuildSketch(Plane.YZ.offset(BOSS_EXTRUDE32_START)):
        Polygon((-11.32398317, 11.293538096), (-2.16, 11.293538096), (-2.867106781, 12.000644877), (-2.574213562, 12.293538096), (-11.32398317, 12.293538096), align=None)
    extrude(amount=BOSS_EXTRUDE32_DEPTH)


with BuildPart() as body_4_4_1:
    # Boss-Extrude32 2 outline → Boss-Extrude32 2 (new body)
    with BuildSketch(Plane.YZ.offset(BOSS_EXTRUDE32_START_2)):
        Polygon((-11.32398317, 11.293538096), (-2.16, 11.293538096), (-2.867106781, 12.000644877), (-2.574213562, 12.293538096), (-11.32398317, 12.293538096), align=None)
    extrude(amount=BOSS_EXTRUDE32_2_DEPTH)


with BuildPart() as body_4_5:
    add(body_4_4.part)

    # Combine9: union body 4 4, body 3 8
    add(body_4_4_1.part)
    add(body_3_8.part)

    # Sketch55 → Boss-Extrude33 (add)
    with BuildSketch(Plane(origin=(0, -11.32398317, 0), x_dir=(1, 0, 0), z_dir=(0, 1, 0))):
        with Locations((10.221556697, -1.004386861)):
            Rectangle(SKETCH55_W, SKETCH55_H)
    extrude(amount=BOSS_EXTRUDE33_DEPTH)

    # Sketch56 → Cut-Extrude25 (cut)
    with BuildSketch(Plane.ZY.offset(-7.421556697)):
        with Locations((0.004386861, -5.661991585)):
            Rectangle(SKETCH56_W, SKETCH56_H)
    extrude(amount=-CUT_EXTRUDE25_DEPTH, mode=Mode.SUBTRACT)


with BuildPart() as cut_extrude28_tool:
    # Sketch62 → Cut-Extrude28 (new body)
    with BuildSketch(Plane(origin=(0, 3, 0), x_dir=(1, 0, 0), z_dir=(0, 1, 0))):
        with Locations((-5.767223107, 30.754931698)):
            Rectangle(SKETCH62_W, SKETCH62_H)
    extrude(amount=-CUT_EXTRUDE28_DEPTH)


with BuildPart() as body_4_6:
    add(body_4_5.part)

    # Cut-Extrude28: cut by cut_extrude28_tool
    add(cut_extrude28_tool.part, mode=Mode.SUBTRACT)

    # Sketch64 → Boss-Extrude35 (add)
    with BuildSketch(Plane(origin=(0, 3, 0), x_dir=(1, 0, 0), z_dir=(0, 1, 0))):
        with Locations((-5.767223107, 5.214512395)):
            Rectangle(SKETCH64_W, SKETCH64_H)
        with Locations((-5.767223107, 56.295351)):
            Rectangle(SKETCH64_W, SKETCH64_H)
    extrude(amount=-BOSS_EXTRUDE35_DEPTH)


with BuildPart() as body_3_6_1:
    add(body_3_6.part)

    # Cut-Extrude28: cut by cut_extrude28_tool
    add(cut_extrude28_tool.part, mode=Mode.SUBTRACT)

    # Sketch65 → Boss-Extrude37 (add)
    with BuildSketch(Plane.XZ):
        with Locations((-5.767223107, -5.214512395)):
            Rectangle(SKETCH65_W, SKETCH65_H)
        with Locations((-5.767223107, -56.295351)):
            Rectangle(SKETCH65_W, SKETCH65_H)
    extrude(amount=-BOSS_EXTRUDE37_DEPTH)


with BuildPart() as cut_extrude31_tool:
    # Sketch67 → Cut-Extrude31 (new body)
    with BuildSketch(Plane.XZ):
        with Locations((-5.767223107, -32.354931697)):
            Rectangle(SKETCH67_W, SKETCH67_H)
    extrude(amount=-CUT_EXTRUDE31_DEPTH)


with BuildPart() as body_4_7:
    add(body_4_6.part)

    # Cut-Extrude31: cut by cut_extrude31_tool
    add(cut_extrude31_tool.part, mode=Mode.SUBTRACT)

    # Sketch71 → Cut-Extrude32 (cut)
    with BuildSketch(Plane(origin=(0, 0, -5.254512395), x_dir=(-1, 0, 0), z_dir=(0, 0, -1))):
        with Locations((5.767223107, 2.5)):
            Rectangle(SKETCH71_W, SKETCH71_H)
    extrude(amount=-CUT_EXTRUDE32_DEPTH, mode=Mode.SUBTRACT)

    # Sketch72 → Boss-Extrude41 (add)
    with BuildSketch(Plane.XY.offset(-56.255351)):
        with Locations((-5.767223107, 2.5)):
            Rectangle(SKETCH72_W, SKETCH72_H)
    extrude(amount=BOSS_EXTRUDE41_DEPTH)

    # Sketch74 → Boss-Extrude43 (add)
    with BuildSketch(Plane(origin=(0, 0, -60.542924633), x_dir=(-1, 0, 0), z_dir=(0, 0, -1))):
        with Locations((5.767223107, 2.5)):
            Rectangle(SKETCH74_W, SKETCH74_H)
    extrude(amount=BOSS_EXTRUDE43_DEPTH)


with BuildPart() as body_3_6_2:
    add(body_3_6_1.part)

    # Cut-Extrude31: cut by cut_extrude31_tool
    add(cut_extrude31_tool.part, mode=Mode.SUBTRACT)

    # Sketch69 → Boss-Extrude39 (add)
    with BuildSketch(Plane(origin=(0, 0, -1.654512395), x_dir=(-1, 0, 0), z_dir=(0, 0, -1))):
        with Locations((6.105401472, 0.5)):
            Rectangle(SKETCH69_W, SKETCH69_H)
    extrude(amount=-BOSS_EXTRUDE39_DEPTH)

    # Sketch70 → Boss-Extrude40 (add)
    with BuildSketch(Plane.XY.offset(-63.055351)):
        with Locations((-5.767223107, 1)):
            Rectangle(SKETCH70_W, SKETCH70_H)
    extrude(amount=BOSS_EXTRUDE40_DEPTH)

    # Sketch73 → Cut-Extrude33 (cut)
    with BuildSketch(Plane.XY.offset(-62.055351)):
        with Locations((-5.767223107, 1)):
            Rectangle(SKETCH73_W, SKETCH73_H)
    extrude(amount=-CUT_EXTRUDE33_DEPTH, mode=Mode.SUBTRACT)


solid = Compound([body_4_7.part, body_3_6_2.part])
